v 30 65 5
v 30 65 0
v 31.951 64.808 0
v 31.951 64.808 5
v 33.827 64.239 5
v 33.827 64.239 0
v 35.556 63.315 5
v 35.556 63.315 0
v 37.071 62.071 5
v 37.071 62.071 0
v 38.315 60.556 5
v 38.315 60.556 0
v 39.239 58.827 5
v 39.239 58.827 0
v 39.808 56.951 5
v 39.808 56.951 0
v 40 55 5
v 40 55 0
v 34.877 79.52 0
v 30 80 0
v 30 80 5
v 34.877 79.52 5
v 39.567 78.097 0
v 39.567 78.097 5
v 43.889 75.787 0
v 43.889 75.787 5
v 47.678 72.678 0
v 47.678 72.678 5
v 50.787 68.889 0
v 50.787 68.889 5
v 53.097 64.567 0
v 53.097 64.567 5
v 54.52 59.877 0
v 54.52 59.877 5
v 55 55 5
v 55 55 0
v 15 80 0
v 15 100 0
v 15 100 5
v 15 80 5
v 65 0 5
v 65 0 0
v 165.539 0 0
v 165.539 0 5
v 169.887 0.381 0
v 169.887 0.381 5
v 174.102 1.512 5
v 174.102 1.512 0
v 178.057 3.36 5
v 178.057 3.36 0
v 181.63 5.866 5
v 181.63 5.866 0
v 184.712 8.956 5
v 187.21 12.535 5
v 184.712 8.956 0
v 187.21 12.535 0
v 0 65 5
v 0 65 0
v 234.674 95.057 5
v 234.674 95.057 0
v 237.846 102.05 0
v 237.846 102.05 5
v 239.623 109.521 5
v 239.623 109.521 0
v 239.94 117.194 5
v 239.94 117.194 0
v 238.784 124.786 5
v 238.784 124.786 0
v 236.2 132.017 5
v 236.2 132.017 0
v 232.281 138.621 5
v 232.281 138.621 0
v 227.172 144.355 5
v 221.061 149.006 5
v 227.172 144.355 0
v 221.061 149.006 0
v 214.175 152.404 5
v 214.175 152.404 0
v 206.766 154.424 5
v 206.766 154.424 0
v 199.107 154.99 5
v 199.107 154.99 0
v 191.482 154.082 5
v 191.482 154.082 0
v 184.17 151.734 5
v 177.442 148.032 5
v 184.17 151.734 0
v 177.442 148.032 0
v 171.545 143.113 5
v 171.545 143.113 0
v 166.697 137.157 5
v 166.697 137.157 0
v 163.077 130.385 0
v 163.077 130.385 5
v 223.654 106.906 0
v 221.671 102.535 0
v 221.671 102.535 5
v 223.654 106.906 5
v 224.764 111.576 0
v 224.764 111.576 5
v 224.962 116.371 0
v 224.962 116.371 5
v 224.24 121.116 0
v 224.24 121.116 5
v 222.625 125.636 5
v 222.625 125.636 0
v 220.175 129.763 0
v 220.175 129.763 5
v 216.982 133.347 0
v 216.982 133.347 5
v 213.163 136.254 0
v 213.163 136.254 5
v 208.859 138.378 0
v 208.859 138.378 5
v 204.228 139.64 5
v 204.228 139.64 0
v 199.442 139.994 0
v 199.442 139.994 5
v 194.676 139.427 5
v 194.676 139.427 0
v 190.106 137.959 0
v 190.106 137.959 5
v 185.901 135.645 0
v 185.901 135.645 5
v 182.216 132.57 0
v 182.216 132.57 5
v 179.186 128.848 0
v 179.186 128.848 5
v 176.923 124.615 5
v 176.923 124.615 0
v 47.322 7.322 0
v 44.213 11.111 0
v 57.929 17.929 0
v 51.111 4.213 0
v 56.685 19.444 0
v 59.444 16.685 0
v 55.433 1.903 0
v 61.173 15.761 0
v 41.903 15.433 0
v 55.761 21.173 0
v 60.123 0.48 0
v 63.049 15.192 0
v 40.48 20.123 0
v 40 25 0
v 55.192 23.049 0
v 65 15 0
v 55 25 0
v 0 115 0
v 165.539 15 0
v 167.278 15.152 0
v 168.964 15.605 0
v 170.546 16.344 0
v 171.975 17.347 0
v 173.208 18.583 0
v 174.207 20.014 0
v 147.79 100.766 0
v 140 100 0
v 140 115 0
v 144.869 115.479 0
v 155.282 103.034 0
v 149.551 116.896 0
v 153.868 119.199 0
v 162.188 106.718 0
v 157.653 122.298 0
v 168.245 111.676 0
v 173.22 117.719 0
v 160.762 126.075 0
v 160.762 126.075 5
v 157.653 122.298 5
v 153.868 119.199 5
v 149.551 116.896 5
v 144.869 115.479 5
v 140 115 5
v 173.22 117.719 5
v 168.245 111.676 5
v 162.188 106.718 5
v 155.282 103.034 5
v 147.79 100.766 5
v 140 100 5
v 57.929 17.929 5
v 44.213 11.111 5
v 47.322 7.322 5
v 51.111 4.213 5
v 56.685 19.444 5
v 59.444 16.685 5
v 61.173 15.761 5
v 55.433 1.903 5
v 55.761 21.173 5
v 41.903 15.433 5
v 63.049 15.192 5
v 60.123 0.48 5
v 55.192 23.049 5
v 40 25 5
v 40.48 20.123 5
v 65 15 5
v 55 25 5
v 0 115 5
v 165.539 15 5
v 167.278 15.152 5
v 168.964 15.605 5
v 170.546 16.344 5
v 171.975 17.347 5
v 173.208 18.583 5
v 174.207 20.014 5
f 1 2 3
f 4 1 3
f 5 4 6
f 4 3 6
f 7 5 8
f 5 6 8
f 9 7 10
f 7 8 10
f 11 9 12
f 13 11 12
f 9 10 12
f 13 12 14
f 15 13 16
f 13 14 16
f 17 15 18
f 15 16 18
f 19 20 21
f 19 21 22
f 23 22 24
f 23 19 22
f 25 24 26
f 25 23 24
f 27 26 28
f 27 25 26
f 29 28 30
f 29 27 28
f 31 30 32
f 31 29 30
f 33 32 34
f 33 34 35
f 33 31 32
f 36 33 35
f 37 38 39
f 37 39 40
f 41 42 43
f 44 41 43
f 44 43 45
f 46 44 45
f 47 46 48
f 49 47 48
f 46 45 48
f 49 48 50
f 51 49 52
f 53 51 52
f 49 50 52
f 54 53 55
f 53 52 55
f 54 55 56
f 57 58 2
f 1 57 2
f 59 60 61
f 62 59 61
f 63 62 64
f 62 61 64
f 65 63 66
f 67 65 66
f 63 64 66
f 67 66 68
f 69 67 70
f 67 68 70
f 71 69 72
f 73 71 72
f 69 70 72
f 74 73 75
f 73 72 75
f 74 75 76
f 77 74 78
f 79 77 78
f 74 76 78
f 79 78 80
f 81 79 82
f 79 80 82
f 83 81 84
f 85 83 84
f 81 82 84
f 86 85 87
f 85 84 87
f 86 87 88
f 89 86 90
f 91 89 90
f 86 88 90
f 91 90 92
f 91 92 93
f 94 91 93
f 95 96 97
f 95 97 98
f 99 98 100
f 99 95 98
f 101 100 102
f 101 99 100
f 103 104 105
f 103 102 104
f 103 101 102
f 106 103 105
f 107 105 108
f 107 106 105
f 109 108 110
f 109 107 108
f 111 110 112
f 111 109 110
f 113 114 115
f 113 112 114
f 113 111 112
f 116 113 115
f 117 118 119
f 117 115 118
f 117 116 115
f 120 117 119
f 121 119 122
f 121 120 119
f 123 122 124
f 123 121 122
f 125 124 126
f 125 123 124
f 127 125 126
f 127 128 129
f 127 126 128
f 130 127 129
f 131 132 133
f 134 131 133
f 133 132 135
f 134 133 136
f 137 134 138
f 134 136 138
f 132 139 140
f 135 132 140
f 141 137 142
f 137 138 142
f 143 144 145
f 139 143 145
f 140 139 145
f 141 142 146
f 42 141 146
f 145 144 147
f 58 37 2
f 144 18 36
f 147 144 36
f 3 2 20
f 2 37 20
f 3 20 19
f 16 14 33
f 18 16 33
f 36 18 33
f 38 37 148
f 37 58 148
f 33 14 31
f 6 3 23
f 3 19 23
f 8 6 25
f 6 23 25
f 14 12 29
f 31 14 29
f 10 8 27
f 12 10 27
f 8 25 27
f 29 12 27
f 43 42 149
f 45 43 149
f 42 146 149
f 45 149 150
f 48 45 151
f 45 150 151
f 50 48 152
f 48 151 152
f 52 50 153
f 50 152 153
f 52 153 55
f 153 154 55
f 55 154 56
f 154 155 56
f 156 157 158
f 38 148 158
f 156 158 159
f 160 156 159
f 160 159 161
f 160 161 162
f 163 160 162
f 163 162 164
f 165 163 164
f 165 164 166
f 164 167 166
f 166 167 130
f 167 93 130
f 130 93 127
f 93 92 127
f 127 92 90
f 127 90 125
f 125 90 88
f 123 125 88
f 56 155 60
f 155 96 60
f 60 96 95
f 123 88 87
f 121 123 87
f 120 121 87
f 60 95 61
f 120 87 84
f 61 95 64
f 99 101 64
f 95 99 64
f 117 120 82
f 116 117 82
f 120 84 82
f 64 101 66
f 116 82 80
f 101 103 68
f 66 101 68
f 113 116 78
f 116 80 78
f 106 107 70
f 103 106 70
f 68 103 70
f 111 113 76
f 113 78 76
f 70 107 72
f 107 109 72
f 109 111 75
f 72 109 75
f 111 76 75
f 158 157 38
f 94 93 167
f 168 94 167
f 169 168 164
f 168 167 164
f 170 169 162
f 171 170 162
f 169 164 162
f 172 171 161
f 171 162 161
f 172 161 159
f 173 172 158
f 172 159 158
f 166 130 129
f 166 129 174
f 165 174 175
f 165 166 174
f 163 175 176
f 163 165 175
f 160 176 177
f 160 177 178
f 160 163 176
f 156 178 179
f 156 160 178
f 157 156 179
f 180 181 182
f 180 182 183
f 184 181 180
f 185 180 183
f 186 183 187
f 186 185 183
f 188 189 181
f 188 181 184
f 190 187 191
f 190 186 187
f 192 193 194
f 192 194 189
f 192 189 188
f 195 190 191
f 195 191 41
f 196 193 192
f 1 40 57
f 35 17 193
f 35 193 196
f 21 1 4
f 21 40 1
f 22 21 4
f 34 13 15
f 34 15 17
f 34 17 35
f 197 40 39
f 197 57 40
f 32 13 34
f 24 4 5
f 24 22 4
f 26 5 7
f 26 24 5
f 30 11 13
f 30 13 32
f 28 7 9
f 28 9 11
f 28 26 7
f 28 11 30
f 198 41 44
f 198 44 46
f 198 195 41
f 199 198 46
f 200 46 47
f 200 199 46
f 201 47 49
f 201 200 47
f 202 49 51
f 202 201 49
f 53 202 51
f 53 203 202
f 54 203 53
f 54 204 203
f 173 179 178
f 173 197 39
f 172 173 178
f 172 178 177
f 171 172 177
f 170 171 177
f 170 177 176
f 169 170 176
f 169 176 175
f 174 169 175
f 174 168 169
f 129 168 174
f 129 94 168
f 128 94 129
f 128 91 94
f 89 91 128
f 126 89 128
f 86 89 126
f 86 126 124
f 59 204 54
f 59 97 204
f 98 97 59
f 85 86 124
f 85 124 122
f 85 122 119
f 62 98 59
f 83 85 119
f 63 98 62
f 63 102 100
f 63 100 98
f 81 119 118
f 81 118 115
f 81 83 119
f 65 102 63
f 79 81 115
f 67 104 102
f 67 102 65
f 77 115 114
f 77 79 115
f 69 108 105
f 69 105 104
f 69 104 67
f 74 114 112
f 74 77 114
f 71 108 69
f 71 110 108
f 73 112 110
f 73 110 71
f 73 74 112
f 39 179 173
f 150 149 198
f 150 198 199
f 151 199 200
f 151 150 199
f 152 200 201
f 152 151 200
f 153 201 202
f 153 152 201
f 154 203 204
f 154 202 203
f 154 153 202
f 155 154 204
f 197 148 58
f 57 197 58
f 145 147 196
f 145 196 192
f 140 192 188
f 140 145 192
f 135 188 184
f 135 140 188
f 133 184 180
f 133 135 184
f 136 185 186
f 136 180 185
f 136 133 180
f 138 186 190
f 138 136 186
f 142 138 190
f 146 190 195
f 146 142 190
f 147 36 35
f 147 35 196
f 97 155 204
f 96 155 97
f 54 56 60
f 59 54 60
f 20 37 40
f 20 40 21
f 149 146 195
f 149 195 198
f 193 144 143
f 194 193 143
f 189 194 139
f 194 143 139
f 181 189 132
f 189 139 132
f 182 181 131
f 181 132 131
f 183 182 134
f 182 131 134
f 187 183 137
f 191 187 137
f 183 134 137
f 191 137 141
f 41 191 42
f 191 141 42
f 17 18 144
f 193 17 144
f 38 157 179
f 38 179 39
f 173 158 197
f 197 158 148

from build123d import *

# Parameters (mm, degrees)
BOSS_EXTRUDE1_DEPTH = 5
SHELL1_T            = -15


with BuildPart() as part:
    # Sketch3 → Boss-Extrude1 (new body)
    with BuildSketch(Plane.XY):
        with BuildLine():
            Line((140, 115), (0, 115))
            Line((0, 115), (0, 65))
            Line((0, 65), (30, 65))
            ThreePointArc((30, 65), (37.071067812, 62.071067812), (40, 55))
            Line((40, 55), (40, 25))
            ThreePointArc((40, 25), (47.32233047, 7.32233047), (65, 0))
            Line((65, 0), (165.538941775, 0))
            ThreePointArc((165.538941775, 0), (178.05666204, 3.359605379), (187.210014279, 12.535465651))
            Line((187.210014279, 12.535465651), (234.673716006, 95.056745042))
            ThreePointArc((234.673716006, 95.056745042), (217.699703722, 150.870886358), (163.076923077, 130.384615385))
            ThreePointArc((163.076923077, 130.384615385), (153.867504906, 119.198742642), (140, 115))
        make_face()
    extrude(amount=BOSS_EXTRUDE1_DEPTH)

    # Shell1
    shell1_openings = [part.faces().sort_by_distance(p)[0] for p in [
        (98.657145907, 64.238067092, 5),
        (98.657145907, 64.238067092, 0),
    ]]
    offset(amount=SHELL1_T, openings=shell1_openings, kind=Kind.INTERSECTION)


solid = part.part
